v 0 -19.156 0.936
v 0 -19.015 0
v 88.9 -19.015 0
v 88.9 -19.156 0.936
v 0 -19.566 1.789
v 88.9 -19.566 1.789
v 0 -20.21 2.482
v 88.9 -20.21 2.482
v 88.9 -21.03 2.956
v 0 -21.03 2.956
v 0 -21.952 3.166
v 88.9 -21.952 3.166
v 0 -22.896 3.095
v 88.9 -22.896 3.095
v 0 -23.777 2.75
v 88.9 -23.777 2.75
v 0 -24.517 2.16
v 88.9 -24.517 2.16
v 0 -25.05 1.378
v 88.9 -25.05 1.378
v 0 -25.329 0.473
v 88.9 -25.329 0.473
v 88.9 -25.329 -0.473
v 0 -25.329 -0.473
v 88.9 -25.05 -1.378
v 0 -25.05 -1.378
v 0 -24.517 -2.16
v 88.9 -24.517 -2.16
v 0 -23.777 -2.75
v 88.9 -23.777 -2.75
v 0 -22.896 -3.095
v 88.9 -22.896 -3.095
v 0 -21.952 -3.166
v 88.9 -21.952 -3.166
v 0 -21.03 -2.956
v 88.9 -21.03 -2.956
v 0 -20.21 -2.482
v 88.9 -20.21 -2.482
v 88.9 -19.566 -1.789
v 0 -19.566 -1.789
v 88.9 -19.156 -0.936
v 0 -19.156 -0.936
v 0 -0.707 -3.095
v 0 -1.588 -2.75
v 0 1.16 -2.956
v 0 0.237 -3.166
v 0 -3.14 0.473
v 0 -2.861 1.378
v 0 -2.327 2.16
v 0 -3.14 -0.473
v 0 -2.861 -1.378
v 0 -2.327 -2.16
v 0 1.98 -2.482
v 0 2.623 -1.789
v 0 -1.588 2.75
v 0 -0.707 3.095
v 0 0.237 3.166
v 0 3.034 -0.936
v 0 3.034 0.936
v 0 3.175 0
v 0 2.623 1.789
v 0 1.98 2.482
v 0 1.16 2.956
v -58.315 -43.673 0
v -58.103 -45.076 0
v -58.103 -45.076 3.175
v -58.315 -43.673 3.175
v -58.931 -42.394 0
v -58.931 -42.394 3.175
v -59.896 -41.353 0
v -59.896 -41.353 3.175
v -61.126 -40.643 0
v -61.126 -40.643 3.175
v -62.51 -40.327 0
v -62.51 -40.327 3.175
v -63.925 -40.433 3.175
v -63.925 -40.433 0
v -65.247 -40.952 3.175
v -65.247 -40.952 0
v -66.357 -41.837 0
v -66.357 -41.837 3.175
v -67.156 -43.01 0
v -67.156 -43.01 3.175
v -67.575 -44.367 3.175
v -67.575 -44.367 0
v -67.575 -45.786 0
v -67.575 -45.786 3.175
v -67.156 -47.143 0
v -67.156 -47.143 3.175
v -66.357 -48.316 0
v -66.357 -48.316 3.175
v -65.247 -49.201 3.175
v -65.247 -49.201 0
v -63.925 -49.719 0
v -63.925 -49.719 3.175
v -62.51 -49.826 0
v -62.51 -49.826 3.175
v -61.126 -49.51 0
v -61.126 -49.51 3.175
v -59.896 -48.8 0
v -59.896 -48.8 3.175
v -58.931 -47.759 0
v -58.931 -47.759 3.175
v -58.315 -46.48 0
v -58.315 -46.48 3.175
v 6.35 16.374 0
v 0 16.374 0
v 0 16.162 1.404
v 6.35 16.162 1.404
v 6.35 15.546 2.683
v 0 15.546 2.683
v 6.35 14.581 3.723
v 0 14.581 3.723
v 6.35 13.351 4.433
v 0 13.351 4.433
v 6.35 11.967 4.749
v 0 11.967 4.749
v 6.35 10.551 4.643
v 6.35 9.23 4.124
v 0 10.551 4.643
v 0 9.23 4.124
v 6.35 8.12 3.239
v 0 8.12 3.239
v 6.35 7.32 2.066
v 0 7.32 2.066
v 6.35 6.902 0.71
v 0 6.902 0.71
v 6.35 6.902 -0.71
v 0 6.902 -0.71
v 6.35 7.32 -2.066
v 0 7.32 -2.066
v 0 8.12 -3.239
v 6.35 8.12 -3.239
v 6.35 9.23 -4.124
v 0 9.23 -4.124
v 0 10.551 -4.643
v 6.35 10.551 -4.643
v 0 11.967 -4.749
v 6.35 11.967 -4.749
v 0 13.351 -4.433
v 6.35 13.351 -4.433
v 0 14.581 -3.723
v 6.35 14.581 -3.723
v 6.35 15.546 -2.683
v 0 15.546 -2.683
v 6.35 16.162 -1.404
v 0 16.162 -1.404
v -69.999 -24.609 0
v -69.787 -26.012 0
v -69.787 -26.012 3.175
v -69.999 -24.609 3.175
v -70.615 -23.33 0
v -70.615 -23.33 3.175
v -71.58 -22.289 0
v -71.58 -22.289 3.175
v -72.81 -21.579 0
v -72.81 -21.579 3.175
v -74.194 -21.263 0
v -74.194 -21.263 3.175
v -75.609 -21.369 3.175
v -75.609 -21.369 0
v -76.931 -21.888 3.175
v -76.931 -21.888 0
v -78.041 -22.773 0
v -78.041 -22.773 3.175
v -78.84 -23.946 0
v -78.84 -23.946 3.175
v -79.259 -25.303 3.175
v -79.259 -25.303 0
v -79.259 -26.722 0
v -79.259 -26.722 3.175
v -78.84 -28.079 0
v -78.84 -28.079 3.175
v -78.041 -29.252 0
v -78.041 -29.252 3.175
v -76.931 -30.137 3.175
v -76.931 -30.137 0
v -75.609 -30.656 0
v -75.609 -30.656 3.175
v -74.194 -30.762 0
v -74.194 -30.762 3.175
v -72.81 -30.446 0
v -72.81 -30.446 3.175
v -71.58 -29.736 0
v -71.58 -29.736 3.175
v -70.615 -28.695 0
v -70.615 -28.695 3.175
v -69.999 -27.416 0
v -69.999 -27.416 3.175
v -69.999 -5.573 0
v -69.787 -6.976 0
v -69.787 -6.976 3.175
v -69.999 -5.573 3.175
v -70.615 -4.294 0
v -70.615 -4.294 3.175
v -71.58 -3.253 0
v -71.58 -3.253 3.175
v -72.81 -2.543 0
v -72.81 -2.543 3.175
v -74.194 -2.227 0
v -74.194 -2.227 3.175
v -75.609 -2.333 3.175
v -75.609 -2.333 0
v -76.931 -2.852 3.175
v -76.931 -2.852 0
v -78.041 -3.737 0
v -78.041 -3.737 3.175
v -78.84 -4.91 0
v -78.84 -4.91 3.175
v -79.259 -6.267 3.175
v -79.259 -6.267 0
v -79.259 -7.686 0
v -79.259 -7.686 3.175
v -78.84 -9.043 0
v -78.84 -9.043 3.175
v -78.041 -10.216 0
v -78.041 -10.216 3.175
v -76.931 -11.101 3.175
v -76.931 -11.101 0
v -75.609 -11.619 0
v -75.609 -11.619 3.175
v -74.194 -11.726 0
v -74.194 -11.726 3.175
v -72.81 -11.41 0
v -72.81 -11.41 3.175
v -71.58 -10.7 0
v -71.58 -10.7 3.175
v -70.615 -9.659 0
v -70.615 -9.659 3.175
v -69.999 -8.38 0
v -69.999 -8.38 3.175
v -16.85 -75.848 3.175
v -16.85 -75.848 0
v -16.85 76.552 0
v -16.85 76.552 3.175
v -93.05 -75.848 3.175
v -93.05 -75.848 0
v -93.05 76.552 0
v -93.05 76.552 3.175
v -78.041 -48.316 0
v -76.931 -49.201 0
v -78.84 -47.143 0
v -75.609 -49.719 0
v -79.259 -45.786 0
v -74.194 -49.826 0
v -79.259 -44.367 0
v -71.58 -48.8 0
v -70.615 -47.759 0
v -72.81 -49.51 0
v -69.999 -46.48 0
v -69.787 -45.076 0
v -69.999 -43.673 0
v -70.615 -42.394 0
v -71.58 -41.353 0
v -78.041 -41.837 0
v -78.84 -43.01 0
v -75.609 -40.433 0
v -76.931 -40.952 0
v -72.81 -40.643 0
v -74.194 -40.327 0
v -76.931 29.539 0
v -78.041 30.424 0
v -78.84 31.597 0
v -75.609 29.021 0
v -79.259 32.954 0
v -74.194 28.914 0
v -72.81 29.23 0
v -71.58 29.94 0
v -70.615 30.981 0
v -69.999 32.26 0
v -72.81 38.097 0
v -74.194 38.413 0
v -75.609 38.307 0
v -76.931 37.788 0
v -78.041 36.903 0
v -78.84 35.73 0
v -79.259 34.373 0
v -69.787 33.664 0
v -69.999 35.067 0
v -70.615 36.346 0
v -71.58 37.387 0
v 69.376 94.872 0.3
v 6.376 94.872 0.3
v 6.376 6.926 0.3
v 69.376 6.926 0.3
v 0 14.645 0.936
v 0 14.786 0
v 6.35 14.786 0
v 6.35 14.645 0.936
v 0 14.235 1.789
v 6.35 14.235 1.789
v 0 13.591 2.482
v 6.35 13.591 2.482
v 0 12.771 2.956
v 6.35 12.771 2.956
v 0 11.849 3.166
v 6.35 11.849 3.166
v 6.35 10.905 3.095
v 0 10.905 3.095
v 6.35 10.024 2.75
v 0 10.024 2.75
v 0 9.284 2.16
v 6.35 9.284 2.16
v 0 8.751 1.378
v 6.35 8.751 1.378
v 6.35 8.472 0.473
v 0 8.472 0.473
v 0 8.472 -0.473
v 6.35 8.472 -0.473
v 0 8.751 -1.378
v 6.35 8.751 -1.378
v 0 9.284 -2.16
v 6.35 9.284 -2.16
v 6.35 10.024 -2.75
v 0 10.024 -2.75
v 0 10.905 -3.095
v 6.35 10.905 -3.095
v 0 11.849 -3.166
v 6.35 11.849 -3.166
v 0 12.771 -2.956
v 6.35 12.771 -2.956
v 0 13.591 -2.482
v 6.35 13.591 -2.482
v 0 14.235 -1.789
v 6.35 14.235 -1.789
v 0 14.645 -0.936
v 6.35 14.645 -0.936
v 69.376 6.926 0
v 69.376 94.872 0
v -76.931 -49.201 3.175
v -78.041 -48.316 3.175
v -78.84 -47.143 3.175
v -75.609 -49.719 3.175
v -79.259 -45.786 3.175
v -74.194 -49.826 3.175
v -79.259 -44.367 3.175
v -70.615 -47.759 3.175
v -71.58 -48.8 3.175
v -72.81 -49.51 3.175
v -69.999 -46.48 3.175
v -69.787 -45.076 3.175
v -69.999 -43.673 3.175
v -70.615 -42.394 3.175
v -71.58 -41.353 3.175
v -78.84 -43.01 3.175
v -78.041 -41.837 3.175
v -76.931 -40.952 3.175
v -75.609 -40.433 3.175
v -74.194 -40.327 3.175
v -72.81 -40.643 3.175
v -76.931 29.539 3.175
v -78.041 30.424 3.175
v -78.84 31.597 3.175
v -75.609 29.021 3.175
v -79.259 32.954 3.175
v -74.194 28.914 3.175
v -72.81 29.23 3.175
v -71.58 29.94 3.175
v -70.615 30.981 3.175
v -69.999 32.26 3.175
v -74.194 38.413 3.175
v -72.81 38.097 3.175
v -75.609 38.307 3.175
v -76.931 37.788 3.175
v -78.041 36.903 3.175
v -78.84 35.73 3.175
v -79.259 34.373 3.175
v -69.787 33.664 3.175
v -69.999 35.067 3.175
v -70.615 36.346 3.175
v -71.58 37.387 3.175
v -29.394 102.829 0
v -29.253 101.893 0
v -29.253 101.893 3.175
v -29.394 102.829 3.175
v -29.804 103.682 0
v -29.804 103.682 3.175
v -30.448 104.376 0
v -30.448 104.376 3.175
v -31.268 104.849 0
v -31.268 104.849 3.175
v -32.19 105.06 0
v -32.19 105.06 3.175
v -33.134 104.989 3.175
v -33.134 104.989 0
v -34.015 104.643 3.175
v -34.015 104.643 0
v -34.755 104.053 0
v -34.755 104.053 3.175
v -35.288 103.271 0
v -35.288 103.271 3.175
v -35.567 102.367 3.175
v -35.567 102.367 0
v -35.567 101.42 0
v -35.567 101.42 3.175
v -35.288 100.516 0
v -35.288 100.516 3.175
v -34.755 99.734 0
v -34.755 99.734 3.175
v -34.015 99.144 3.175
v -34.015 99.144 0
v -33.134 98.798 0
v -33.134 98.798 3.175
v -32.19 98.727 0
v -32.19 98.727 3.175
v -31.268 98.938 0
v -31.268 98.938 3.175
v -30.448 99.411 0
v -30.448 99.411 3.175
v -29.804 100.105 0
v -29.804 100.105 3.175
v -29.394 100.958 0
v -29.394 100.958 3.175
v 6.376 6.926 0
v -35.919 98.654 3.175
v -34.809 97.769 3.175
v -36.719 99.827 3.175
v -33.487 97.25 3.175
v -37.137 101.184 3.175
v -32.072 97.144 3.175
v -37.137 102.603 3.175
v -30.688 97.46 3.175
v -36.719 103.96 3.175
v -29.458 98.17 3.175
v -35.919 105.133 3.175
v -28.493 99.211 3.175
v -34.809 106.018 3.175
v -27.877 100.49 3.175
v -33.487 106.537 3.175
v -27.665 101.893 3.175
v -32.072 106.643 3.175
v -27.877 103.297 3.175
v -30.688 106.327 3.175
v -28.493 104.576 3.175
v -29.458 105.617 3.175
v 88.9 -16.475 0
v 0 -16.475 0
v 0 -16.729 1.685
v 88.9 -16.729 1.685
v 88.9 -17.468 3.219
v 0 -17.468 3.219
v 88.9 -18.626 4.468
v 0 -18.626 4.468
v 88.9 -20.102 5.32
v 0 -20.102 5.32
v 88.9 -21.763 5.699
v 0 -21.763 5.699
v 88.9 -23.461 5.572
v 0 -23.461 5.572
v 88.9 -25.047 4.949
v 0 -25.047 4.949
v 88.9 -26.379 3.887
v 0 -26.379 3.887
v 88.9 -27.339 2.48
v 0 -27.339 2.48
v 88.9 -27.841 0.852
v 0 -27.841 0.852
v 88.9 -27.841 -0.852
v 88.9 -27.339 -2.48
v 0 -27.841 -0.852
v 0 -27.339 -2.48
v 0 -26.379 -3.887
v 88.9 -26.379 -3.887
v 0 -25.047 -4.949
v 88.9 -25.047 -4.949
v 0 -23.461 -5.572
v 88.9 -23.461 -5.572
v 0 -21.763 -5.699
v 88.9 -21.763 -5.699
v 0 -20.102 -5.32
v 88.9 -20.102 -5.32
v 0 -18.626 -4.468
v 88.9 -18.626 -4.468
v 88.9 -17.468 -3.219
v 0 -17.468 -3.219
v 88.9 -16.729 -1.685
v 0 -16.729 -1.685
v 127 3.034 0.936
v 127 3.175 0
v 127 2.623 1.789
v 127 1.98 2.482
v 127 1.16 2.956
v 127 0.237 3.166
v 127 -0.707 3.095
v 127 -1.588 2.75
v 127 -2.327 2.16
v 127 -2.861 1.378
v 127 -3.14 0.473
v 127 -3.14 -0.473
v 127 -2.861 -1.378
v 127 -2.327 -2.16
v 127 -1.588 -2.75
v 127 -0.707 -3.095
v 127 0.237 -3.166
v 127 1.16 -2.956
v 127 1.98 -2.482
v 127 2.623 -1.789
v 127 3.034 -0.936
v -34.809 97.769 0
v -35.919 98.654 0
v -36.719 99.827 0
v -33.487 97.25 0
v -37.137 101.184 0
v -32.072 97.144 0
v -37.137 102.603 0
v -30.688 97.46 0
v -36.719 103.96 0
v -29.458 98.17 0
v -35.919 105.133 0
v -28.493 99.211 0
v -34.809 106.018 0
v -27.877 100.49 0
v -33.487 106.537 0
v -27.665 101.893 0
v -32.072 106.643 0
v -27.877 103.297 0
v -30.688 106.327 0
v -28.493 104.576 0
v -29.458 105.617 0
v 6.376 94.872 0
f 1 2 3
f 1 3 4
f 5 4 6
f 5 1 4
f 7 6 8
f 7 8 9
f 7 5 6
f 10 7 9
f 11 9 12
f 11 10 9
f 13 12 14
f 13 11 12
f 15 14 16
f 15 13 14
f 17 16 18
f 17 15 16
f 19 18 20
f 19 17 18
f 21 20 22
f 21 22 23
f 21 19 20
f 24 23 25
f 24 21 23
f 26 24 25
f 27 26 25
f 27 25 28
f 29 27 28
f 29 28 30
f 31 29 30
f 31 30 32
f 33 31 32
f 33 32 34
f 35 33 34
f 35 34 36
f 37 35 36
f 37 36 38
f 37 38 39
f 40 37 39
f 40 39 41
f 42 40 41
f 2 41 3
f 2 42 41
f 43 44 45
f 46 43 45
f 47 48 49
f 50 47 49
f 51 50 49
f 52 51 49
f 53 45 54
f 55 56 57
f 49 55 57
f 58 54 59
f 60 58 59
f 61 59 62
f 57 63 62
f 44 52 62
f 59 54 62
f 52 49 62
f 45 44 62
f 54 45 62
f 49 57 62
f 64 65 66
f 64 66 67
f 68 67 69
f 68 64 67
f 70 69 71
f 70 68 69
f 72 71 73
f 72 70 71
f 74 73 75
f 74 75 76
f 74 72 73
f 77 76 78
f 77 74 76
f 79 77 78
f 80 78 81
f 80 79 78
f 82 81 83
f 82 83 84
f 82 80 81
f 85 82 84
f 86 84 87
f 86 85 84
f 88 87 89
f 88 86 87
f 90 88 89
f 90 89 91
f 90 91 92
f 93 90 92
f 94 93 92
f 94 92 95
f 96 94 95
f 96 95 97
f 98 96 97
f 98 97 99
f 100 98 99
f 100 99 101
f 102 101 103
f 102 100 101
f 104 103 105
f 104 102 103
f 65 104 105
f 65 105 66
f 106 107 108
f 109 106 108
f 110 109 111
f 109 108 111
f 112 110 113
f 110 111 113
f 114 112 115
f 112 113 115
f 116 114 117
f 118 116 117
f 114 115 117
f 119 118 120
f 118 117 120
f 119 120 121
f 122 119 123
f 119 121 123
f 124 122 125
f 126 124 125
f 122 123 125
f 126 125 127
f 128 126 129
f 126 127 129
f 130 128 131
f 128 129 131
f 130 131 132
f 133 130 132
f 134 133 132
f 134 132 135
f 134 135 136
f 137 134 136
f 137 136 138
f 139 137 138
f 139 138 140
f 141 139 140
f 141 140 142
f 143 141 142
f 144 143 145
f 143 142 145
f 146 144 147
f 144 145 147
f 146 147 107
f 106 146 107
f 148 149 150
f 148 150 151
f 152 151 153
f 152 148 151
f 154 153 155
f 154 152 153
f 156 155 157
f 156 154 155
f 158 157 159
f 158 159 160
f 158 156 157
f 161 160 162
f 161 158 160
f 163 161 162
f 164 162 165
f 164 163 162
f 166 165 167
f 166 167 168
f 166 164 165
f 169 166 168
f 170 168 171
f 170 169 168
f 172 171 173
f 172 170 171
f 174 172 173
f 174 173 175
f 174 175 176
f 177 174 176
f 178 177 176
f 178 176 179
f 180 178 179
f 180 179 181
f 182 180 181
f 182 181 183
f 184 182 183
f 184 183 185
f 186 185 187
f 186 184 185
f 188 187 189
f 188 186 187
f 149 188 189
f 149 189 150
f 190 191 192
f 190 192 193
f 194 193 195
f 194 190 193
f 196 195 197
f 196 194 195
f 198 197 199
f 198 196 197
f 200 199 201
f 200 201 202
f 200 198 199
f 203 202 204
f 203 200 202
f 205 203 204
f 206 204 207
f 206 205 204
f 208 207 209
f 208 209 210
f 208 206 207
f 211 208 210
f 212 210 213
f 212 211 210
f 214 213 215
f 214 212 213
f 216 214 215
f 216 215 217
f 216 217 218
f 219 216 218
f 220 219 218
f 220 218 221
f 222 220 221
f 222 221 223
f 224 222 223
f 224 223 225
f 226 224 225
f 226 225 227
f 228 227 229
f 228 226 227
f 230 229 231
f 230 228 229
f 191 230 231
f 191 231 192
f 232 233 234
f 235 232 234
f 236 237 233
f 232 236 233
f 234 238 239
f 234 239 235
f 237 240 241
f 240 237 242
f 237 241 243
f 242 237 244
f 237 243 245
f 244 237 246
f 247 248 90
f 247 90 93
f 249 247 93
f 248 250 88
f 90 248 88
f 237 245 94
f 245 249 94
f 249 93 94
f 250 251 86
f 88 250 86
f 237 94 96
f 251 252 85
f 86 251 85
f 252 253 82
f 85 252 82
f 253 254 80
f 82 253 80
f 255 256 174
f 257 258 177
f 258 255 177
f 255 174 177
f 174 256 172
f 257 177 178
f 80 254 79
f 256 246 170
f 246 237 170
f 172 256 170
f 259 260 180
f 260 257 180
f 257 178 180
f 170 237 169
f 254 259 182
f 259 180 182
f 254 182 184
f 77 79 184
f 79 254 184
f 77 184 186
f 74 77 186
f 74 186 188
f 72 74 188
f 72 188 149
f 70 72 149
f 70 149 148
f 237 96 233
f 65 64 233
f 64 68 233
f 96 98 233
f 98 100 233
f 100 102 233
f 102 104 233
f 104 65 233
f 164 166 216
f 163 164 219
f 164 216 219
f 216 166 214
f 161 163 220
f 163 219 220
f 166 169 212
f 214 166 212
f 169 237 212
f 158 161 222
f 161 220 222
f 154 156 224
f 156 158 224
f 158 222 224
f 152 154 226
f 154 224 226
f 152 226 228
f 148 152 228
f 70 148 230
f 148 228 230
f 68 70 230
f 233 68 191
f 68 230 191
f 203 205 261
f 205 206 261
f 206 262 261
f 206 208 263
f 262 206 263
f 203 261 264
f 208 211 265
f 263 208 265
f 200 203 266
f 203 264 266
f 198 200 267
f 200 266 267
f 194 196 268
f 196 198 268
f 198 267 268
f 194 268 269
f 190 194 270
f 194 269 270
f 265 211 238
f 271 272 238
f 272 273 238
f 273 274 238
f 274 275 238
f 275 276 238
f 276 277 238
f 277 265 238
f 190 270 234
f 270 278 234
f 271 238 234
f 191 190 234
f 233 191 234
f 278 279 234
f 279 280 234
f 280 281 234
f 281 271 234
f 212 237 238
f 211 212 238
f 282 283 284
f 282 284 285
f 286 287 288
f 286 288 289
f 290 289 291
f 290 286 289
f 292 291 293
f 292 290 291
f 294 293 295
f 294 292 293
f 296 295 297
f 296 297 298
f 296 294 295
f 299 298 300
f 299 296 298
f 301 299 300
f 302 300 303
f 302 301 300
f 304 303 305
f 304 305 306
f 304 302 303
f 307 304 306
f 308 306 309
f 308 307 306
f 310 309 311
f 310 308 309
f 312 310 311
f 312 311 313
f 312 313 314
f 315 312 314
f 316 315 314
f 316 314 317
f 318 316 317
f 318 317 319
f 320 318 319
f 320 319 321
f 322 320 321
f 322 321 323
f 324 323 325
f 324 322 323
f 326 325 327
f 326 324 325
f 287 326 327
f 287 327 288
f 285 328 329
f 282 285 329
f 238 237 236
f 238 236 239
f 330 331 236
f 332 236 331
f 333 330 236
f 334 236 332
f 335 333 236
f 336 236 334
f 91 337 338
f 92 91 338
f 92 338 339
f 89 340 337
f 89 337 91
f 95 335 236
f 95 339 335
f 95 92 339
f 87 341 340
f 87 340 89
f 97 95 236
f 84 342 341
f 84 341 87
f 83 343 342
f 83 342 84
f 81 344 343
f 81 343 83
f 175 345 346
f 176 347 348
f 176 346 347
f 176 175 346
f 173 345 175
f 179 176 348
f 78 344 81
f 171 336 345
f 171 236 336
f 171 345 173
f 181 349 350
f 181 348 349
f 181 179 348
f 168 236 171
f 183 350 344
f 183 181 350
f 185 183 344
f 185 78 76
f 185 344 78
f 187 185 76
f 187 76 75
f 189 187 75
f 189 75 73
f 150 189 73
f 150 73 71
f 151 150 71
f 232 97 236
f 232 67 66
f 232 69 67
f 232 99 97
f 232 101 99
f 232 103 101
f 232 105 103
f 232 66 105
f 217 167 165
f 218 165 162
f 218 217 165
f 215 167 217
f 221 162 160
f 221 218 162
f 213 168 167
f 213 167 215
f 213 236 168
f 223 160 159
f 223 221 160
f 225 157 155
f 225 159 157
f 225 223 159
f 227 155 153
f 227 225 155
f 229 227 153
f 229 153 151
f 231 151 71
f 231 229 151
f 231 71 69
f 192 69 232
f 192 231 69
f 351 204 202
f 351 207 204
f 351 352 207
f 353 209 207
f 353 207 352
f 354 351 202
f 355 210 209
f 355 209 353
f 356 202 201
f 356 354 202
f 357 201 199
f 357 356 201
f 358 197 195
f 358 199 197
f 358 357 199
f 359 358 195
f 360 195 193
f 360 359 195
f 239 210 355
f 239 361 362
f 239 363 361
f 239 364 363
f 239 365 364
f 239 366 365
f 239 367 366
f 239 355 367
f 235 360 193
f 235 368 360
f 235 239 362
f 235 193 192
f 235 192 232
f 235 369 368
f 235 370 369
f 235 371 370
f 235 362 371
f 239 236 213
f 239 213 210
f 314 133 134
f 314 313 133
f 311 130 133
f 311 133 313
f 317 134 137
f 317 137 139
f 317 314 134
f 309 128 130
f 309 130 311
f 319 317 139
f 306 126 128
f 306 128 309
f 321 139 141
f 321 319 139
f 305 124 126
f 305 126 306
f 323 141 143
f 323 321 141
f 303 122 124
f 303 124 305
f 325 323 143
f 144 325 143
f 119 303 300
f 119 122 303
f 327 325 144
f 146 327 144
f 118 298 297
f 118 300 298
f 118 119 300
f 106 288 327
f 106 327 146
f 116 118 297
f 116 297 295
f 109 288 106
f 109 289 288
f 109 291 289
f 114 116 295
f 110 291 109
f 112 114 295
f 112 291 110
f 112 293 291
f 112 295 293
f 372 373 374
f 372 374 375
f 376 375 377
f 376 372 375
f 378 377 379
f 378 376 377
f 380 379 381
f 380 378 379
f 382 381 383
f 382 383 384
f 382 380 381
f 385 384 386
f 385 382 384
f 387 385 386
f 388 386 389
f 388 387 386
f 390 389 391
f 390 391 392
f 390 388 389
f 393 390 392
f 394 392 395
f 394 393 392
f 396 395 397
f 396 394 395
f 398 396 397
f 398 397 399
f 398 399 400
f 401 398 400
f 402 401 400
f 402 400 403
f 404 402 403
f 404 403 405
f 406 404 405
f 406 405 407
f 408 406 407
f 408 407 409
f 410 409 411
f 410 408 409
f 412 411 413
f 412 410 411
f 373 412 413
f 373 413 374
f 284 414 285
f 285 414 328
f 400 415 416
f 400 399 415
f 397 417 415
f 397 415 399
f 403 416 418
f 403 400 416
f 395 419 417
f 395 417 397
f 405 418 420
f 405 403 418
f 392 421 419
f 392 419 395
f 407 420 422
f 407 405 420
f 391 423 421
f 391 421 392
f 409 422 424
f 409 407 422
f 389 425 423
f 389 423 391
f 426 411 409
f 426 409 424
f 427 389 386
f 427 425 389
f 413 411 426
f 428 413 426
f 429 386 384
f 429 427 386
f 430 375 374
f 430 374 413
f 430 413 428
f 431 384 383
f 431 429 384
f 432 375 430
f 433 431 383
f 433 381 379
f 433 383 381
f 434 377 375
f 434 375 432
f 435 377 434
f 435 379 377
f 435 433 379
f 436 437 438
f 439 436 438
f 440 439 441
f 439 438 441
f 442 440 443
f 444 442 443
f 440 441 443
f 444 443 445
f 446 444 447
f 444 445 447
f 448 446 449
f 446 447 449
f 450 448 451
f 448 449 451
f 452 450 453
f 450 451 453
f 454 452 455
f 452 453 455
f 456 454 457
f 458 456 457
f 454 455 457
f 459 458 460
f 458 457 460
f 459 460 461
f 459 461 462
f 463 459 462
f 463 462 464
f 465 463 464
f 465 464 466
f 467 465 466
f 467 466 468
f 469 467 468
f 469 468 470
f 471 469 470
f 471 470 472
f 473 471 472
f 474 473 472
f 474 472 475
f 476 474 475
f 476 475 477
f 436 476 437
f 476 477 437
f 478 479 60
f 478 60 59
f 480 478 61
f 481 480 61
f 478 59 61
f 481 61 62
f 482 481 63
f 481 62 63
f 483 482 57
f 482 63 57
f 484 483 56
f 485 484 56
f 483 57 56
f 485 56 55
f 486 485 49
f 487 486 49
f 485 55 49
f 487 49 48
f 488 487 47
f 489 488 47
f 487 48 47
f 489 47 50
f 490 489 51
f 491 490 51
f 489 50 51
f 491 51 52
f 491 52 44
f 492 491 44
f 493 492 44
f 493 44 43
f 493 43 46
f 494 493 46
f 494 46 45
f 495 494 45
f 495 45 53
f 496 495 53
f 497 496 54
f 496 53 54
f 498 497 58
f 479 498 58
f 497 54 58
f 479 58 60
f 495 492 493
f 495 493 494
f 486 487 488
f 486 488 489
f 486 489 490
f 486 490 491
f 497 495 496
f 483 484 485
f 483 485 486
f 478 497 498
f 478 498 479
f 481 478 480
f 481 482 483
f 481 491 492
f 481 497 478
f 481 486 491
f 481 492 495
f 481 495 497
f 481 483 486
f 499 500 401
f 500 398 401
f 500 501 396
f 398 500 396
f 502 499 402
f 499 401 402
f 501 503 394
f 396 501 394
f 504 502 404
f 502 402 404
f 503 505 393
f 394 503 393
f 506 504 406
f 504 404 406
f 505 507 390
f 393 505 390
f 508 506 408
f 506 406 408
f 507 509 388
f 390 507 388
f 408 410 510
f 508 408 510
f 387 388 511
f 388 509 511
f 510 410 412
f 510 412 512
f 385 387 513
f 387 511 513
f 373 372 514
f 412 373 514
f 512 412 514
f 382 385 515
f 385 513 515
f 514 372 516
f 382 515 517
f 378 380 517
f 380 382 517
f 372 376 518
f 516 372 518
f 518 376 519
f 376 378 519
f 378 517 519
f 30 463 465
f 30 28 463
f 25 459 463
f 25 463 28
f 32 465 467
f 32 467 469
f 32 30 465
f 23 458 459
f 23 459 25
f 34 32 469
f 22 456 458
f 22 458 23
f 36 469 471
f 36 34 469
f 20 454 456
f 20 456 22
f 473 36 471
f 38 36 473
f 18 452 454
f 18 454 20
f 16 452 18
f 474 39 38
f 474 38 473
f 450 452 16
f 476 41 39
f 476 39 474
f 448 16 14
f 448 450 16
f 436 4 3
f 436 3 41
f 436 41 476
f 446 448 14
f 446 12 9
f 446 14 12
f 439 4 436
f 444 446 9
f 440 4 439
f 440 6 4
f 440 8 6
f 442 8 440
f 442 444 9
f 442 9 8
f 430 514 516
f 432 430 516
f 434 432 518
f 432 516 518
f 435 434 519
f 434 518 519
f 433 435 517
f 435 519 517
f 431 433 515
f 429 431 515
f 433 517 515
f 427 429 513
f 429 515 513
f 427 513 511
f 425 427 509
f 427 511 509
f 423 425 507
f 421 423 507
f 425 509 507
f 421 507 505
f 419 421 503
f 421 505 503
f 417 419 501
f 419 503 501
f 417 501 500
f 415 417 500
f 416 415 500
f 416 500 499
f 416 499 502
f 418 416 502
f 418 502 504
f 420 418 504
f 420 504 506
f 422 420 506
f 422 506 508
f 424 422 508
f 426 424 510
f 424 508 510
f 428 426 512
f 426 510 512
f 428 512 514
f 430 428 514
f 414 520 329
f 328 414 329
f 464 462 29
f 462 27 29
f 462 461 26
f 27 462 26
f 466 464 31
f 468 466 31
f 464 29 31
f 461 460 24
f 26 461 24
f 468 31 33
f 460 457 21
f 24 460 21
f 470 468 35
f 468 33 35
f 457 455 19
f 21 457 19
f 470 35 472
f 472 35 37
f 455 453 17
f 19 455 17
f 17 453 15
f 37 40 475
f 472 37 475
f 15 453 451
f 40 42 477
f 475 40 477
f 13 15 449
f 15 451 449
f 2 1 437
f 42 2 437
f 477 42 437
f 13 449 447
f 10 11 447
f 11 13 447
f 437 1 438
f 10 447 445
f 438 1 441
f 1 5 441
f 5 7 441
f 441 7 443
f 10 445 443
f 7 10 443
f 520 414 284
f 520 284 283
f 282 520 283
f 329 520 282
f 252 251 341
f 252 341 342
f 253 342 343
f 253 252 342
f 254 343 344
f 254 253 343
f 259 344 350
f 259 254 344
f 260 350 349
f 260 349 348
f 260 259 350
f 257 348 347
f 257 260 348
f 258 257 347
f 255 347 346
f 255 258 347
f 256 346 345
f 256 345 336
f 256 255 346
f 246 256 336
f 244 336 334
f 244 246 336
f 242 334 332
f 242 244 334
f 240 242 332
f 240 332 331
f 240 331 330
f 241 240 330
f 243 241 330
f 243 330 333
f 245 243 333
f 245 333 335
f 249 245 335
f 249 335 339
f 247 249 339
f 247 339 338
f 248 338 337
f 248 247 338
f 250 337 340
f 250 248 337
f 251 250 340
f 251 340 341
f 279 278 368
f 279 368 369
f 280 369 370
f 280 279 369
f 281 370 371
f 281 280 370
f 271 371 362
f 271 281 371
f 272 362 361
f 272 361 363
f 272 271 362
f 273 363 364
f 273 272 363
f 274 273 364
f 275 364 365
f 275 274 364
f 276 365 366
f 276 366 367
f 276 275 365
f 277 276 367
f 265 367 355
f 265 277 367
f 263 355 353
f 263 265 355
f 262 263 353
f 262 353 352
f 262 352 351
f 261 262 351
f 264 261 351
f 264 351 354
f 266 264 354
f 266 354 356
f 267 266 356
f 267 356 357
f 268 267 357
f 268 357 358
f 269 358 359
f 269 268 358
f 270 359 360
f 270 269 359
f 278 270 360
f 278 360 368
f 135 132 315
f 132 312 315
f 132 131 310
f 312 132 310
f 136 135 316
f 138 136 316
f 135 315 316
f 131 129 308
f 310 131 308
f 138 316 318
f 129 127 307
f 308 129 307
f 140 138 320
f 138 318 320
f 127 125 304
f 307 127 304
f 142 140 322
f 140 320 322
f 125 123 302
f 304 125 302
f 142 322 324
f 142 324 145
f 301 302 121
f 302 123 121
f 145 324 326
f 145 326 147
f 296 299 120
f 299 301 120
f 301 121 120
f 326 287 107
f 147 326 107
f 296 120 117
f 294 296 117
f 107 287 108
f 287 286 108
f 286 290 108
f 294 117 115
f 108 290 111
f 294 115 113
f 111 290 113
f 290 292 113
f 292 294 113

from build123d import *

# Parameters (mm, degrees)
F0_R     = 3.175
F1_DEPTH = 127
F0_R_2   = 5.715
F2_DEPTH = 88.9
F3_W     = 63
F3_H     = 87.946309
F4_DEPTH = 0.3
F0_R_3   = 4.7625
F5_DEPTH = 6.35
F6_W     = 76.2
F6_H     = 152.4
F6_R     = 4.7625
F7_DEPTH = 3.175
F8_R     = 4.7625
F8_R_2   = 3.175
F9_DEPTH = 3.175


with BuildPart() as f1:
    # F0 (on Right) → F1 (new body)
    with BuildSketch(Plane.YZ):
        Circle(F0_R)
    extrude(amount=F1_DEPTH)


with BuildPart() as f2:
    # F0 (on Right) → F2 (new body)
    with BuildSketch(Plane.YZ):
        with Locations((-22.189628, 0)):
            Circle(F0_R_2)
        with Locations((-22.189628, 0)):
            Circle(F0_R, mode=Mode.SUBTRACT)
    extrude(amount=F2_DEPTH)


with BuildPart() as f4:
    # F3 (on Top) → F4 (new body)
    with BuildSketch(Plane.XY):
        with Locations((37.876387, 50.899224)):
            Rectangle(F3_W, F3_H)
    extrude(amount=F4_DEPTH)


with BuildPart() as f5:
    # F0 (on Right) → F5 (new body)
    with BuildSketch(Plane.YZ):
        with Locations((11.611233, 0)):
            Circle(F0_R_3)
        with Locations((11.611233, 0)):
            Circle(F0_R, mode=Mode.SUBTRACT)
    extrude(amount=F5_DEPTH)


with BuildPart() as f7:
    # F6 (on Top) → F7 (new body)
    with BuildSketch(Plane.XY):
        with Locations((-54.949955, 0.351957)):
            Rectangle(F6_W, F6_H)
        with Locations((-74.549506, -45.076377)):
            Circle(F6_R, mode=Mode.SUBTRACT)
        with Locations((-62.865506, -45.076377)):
            Circle(F6_R, mode=Mode.SUBTRACT)
        with Locations((-74.549506, -26.012443)):
            Circle(F6_R, mode=Mode.SUBTRACT)
        with Locations((-74.549506, -6.976377)):
            Circle(F6_R, mode=Mode.SUBTRACT)
        with Locations((-74.549506, 33.663623)):
            Circle(F6_R, mode=Mode.SUBTRACT)
    extrude(amount=F7_DEPTH)


with BuildPart() as f9:
    # F8 (on Top) → F9 (new body)
    with BuildSketch(Plane.XY):
        with Locations((-32.427739, 101.893432)):
            Circle(F8_R)
        with Locations((-32.427739, 101.893432)):
            Circle(F8_R_2, mode=Mode.SUBTRACT)
    extrude(amount=F9_DEPTH)


solid = Compound([f1.part, f2.part, f4.part, f5.part, f7.part, f9.part])
